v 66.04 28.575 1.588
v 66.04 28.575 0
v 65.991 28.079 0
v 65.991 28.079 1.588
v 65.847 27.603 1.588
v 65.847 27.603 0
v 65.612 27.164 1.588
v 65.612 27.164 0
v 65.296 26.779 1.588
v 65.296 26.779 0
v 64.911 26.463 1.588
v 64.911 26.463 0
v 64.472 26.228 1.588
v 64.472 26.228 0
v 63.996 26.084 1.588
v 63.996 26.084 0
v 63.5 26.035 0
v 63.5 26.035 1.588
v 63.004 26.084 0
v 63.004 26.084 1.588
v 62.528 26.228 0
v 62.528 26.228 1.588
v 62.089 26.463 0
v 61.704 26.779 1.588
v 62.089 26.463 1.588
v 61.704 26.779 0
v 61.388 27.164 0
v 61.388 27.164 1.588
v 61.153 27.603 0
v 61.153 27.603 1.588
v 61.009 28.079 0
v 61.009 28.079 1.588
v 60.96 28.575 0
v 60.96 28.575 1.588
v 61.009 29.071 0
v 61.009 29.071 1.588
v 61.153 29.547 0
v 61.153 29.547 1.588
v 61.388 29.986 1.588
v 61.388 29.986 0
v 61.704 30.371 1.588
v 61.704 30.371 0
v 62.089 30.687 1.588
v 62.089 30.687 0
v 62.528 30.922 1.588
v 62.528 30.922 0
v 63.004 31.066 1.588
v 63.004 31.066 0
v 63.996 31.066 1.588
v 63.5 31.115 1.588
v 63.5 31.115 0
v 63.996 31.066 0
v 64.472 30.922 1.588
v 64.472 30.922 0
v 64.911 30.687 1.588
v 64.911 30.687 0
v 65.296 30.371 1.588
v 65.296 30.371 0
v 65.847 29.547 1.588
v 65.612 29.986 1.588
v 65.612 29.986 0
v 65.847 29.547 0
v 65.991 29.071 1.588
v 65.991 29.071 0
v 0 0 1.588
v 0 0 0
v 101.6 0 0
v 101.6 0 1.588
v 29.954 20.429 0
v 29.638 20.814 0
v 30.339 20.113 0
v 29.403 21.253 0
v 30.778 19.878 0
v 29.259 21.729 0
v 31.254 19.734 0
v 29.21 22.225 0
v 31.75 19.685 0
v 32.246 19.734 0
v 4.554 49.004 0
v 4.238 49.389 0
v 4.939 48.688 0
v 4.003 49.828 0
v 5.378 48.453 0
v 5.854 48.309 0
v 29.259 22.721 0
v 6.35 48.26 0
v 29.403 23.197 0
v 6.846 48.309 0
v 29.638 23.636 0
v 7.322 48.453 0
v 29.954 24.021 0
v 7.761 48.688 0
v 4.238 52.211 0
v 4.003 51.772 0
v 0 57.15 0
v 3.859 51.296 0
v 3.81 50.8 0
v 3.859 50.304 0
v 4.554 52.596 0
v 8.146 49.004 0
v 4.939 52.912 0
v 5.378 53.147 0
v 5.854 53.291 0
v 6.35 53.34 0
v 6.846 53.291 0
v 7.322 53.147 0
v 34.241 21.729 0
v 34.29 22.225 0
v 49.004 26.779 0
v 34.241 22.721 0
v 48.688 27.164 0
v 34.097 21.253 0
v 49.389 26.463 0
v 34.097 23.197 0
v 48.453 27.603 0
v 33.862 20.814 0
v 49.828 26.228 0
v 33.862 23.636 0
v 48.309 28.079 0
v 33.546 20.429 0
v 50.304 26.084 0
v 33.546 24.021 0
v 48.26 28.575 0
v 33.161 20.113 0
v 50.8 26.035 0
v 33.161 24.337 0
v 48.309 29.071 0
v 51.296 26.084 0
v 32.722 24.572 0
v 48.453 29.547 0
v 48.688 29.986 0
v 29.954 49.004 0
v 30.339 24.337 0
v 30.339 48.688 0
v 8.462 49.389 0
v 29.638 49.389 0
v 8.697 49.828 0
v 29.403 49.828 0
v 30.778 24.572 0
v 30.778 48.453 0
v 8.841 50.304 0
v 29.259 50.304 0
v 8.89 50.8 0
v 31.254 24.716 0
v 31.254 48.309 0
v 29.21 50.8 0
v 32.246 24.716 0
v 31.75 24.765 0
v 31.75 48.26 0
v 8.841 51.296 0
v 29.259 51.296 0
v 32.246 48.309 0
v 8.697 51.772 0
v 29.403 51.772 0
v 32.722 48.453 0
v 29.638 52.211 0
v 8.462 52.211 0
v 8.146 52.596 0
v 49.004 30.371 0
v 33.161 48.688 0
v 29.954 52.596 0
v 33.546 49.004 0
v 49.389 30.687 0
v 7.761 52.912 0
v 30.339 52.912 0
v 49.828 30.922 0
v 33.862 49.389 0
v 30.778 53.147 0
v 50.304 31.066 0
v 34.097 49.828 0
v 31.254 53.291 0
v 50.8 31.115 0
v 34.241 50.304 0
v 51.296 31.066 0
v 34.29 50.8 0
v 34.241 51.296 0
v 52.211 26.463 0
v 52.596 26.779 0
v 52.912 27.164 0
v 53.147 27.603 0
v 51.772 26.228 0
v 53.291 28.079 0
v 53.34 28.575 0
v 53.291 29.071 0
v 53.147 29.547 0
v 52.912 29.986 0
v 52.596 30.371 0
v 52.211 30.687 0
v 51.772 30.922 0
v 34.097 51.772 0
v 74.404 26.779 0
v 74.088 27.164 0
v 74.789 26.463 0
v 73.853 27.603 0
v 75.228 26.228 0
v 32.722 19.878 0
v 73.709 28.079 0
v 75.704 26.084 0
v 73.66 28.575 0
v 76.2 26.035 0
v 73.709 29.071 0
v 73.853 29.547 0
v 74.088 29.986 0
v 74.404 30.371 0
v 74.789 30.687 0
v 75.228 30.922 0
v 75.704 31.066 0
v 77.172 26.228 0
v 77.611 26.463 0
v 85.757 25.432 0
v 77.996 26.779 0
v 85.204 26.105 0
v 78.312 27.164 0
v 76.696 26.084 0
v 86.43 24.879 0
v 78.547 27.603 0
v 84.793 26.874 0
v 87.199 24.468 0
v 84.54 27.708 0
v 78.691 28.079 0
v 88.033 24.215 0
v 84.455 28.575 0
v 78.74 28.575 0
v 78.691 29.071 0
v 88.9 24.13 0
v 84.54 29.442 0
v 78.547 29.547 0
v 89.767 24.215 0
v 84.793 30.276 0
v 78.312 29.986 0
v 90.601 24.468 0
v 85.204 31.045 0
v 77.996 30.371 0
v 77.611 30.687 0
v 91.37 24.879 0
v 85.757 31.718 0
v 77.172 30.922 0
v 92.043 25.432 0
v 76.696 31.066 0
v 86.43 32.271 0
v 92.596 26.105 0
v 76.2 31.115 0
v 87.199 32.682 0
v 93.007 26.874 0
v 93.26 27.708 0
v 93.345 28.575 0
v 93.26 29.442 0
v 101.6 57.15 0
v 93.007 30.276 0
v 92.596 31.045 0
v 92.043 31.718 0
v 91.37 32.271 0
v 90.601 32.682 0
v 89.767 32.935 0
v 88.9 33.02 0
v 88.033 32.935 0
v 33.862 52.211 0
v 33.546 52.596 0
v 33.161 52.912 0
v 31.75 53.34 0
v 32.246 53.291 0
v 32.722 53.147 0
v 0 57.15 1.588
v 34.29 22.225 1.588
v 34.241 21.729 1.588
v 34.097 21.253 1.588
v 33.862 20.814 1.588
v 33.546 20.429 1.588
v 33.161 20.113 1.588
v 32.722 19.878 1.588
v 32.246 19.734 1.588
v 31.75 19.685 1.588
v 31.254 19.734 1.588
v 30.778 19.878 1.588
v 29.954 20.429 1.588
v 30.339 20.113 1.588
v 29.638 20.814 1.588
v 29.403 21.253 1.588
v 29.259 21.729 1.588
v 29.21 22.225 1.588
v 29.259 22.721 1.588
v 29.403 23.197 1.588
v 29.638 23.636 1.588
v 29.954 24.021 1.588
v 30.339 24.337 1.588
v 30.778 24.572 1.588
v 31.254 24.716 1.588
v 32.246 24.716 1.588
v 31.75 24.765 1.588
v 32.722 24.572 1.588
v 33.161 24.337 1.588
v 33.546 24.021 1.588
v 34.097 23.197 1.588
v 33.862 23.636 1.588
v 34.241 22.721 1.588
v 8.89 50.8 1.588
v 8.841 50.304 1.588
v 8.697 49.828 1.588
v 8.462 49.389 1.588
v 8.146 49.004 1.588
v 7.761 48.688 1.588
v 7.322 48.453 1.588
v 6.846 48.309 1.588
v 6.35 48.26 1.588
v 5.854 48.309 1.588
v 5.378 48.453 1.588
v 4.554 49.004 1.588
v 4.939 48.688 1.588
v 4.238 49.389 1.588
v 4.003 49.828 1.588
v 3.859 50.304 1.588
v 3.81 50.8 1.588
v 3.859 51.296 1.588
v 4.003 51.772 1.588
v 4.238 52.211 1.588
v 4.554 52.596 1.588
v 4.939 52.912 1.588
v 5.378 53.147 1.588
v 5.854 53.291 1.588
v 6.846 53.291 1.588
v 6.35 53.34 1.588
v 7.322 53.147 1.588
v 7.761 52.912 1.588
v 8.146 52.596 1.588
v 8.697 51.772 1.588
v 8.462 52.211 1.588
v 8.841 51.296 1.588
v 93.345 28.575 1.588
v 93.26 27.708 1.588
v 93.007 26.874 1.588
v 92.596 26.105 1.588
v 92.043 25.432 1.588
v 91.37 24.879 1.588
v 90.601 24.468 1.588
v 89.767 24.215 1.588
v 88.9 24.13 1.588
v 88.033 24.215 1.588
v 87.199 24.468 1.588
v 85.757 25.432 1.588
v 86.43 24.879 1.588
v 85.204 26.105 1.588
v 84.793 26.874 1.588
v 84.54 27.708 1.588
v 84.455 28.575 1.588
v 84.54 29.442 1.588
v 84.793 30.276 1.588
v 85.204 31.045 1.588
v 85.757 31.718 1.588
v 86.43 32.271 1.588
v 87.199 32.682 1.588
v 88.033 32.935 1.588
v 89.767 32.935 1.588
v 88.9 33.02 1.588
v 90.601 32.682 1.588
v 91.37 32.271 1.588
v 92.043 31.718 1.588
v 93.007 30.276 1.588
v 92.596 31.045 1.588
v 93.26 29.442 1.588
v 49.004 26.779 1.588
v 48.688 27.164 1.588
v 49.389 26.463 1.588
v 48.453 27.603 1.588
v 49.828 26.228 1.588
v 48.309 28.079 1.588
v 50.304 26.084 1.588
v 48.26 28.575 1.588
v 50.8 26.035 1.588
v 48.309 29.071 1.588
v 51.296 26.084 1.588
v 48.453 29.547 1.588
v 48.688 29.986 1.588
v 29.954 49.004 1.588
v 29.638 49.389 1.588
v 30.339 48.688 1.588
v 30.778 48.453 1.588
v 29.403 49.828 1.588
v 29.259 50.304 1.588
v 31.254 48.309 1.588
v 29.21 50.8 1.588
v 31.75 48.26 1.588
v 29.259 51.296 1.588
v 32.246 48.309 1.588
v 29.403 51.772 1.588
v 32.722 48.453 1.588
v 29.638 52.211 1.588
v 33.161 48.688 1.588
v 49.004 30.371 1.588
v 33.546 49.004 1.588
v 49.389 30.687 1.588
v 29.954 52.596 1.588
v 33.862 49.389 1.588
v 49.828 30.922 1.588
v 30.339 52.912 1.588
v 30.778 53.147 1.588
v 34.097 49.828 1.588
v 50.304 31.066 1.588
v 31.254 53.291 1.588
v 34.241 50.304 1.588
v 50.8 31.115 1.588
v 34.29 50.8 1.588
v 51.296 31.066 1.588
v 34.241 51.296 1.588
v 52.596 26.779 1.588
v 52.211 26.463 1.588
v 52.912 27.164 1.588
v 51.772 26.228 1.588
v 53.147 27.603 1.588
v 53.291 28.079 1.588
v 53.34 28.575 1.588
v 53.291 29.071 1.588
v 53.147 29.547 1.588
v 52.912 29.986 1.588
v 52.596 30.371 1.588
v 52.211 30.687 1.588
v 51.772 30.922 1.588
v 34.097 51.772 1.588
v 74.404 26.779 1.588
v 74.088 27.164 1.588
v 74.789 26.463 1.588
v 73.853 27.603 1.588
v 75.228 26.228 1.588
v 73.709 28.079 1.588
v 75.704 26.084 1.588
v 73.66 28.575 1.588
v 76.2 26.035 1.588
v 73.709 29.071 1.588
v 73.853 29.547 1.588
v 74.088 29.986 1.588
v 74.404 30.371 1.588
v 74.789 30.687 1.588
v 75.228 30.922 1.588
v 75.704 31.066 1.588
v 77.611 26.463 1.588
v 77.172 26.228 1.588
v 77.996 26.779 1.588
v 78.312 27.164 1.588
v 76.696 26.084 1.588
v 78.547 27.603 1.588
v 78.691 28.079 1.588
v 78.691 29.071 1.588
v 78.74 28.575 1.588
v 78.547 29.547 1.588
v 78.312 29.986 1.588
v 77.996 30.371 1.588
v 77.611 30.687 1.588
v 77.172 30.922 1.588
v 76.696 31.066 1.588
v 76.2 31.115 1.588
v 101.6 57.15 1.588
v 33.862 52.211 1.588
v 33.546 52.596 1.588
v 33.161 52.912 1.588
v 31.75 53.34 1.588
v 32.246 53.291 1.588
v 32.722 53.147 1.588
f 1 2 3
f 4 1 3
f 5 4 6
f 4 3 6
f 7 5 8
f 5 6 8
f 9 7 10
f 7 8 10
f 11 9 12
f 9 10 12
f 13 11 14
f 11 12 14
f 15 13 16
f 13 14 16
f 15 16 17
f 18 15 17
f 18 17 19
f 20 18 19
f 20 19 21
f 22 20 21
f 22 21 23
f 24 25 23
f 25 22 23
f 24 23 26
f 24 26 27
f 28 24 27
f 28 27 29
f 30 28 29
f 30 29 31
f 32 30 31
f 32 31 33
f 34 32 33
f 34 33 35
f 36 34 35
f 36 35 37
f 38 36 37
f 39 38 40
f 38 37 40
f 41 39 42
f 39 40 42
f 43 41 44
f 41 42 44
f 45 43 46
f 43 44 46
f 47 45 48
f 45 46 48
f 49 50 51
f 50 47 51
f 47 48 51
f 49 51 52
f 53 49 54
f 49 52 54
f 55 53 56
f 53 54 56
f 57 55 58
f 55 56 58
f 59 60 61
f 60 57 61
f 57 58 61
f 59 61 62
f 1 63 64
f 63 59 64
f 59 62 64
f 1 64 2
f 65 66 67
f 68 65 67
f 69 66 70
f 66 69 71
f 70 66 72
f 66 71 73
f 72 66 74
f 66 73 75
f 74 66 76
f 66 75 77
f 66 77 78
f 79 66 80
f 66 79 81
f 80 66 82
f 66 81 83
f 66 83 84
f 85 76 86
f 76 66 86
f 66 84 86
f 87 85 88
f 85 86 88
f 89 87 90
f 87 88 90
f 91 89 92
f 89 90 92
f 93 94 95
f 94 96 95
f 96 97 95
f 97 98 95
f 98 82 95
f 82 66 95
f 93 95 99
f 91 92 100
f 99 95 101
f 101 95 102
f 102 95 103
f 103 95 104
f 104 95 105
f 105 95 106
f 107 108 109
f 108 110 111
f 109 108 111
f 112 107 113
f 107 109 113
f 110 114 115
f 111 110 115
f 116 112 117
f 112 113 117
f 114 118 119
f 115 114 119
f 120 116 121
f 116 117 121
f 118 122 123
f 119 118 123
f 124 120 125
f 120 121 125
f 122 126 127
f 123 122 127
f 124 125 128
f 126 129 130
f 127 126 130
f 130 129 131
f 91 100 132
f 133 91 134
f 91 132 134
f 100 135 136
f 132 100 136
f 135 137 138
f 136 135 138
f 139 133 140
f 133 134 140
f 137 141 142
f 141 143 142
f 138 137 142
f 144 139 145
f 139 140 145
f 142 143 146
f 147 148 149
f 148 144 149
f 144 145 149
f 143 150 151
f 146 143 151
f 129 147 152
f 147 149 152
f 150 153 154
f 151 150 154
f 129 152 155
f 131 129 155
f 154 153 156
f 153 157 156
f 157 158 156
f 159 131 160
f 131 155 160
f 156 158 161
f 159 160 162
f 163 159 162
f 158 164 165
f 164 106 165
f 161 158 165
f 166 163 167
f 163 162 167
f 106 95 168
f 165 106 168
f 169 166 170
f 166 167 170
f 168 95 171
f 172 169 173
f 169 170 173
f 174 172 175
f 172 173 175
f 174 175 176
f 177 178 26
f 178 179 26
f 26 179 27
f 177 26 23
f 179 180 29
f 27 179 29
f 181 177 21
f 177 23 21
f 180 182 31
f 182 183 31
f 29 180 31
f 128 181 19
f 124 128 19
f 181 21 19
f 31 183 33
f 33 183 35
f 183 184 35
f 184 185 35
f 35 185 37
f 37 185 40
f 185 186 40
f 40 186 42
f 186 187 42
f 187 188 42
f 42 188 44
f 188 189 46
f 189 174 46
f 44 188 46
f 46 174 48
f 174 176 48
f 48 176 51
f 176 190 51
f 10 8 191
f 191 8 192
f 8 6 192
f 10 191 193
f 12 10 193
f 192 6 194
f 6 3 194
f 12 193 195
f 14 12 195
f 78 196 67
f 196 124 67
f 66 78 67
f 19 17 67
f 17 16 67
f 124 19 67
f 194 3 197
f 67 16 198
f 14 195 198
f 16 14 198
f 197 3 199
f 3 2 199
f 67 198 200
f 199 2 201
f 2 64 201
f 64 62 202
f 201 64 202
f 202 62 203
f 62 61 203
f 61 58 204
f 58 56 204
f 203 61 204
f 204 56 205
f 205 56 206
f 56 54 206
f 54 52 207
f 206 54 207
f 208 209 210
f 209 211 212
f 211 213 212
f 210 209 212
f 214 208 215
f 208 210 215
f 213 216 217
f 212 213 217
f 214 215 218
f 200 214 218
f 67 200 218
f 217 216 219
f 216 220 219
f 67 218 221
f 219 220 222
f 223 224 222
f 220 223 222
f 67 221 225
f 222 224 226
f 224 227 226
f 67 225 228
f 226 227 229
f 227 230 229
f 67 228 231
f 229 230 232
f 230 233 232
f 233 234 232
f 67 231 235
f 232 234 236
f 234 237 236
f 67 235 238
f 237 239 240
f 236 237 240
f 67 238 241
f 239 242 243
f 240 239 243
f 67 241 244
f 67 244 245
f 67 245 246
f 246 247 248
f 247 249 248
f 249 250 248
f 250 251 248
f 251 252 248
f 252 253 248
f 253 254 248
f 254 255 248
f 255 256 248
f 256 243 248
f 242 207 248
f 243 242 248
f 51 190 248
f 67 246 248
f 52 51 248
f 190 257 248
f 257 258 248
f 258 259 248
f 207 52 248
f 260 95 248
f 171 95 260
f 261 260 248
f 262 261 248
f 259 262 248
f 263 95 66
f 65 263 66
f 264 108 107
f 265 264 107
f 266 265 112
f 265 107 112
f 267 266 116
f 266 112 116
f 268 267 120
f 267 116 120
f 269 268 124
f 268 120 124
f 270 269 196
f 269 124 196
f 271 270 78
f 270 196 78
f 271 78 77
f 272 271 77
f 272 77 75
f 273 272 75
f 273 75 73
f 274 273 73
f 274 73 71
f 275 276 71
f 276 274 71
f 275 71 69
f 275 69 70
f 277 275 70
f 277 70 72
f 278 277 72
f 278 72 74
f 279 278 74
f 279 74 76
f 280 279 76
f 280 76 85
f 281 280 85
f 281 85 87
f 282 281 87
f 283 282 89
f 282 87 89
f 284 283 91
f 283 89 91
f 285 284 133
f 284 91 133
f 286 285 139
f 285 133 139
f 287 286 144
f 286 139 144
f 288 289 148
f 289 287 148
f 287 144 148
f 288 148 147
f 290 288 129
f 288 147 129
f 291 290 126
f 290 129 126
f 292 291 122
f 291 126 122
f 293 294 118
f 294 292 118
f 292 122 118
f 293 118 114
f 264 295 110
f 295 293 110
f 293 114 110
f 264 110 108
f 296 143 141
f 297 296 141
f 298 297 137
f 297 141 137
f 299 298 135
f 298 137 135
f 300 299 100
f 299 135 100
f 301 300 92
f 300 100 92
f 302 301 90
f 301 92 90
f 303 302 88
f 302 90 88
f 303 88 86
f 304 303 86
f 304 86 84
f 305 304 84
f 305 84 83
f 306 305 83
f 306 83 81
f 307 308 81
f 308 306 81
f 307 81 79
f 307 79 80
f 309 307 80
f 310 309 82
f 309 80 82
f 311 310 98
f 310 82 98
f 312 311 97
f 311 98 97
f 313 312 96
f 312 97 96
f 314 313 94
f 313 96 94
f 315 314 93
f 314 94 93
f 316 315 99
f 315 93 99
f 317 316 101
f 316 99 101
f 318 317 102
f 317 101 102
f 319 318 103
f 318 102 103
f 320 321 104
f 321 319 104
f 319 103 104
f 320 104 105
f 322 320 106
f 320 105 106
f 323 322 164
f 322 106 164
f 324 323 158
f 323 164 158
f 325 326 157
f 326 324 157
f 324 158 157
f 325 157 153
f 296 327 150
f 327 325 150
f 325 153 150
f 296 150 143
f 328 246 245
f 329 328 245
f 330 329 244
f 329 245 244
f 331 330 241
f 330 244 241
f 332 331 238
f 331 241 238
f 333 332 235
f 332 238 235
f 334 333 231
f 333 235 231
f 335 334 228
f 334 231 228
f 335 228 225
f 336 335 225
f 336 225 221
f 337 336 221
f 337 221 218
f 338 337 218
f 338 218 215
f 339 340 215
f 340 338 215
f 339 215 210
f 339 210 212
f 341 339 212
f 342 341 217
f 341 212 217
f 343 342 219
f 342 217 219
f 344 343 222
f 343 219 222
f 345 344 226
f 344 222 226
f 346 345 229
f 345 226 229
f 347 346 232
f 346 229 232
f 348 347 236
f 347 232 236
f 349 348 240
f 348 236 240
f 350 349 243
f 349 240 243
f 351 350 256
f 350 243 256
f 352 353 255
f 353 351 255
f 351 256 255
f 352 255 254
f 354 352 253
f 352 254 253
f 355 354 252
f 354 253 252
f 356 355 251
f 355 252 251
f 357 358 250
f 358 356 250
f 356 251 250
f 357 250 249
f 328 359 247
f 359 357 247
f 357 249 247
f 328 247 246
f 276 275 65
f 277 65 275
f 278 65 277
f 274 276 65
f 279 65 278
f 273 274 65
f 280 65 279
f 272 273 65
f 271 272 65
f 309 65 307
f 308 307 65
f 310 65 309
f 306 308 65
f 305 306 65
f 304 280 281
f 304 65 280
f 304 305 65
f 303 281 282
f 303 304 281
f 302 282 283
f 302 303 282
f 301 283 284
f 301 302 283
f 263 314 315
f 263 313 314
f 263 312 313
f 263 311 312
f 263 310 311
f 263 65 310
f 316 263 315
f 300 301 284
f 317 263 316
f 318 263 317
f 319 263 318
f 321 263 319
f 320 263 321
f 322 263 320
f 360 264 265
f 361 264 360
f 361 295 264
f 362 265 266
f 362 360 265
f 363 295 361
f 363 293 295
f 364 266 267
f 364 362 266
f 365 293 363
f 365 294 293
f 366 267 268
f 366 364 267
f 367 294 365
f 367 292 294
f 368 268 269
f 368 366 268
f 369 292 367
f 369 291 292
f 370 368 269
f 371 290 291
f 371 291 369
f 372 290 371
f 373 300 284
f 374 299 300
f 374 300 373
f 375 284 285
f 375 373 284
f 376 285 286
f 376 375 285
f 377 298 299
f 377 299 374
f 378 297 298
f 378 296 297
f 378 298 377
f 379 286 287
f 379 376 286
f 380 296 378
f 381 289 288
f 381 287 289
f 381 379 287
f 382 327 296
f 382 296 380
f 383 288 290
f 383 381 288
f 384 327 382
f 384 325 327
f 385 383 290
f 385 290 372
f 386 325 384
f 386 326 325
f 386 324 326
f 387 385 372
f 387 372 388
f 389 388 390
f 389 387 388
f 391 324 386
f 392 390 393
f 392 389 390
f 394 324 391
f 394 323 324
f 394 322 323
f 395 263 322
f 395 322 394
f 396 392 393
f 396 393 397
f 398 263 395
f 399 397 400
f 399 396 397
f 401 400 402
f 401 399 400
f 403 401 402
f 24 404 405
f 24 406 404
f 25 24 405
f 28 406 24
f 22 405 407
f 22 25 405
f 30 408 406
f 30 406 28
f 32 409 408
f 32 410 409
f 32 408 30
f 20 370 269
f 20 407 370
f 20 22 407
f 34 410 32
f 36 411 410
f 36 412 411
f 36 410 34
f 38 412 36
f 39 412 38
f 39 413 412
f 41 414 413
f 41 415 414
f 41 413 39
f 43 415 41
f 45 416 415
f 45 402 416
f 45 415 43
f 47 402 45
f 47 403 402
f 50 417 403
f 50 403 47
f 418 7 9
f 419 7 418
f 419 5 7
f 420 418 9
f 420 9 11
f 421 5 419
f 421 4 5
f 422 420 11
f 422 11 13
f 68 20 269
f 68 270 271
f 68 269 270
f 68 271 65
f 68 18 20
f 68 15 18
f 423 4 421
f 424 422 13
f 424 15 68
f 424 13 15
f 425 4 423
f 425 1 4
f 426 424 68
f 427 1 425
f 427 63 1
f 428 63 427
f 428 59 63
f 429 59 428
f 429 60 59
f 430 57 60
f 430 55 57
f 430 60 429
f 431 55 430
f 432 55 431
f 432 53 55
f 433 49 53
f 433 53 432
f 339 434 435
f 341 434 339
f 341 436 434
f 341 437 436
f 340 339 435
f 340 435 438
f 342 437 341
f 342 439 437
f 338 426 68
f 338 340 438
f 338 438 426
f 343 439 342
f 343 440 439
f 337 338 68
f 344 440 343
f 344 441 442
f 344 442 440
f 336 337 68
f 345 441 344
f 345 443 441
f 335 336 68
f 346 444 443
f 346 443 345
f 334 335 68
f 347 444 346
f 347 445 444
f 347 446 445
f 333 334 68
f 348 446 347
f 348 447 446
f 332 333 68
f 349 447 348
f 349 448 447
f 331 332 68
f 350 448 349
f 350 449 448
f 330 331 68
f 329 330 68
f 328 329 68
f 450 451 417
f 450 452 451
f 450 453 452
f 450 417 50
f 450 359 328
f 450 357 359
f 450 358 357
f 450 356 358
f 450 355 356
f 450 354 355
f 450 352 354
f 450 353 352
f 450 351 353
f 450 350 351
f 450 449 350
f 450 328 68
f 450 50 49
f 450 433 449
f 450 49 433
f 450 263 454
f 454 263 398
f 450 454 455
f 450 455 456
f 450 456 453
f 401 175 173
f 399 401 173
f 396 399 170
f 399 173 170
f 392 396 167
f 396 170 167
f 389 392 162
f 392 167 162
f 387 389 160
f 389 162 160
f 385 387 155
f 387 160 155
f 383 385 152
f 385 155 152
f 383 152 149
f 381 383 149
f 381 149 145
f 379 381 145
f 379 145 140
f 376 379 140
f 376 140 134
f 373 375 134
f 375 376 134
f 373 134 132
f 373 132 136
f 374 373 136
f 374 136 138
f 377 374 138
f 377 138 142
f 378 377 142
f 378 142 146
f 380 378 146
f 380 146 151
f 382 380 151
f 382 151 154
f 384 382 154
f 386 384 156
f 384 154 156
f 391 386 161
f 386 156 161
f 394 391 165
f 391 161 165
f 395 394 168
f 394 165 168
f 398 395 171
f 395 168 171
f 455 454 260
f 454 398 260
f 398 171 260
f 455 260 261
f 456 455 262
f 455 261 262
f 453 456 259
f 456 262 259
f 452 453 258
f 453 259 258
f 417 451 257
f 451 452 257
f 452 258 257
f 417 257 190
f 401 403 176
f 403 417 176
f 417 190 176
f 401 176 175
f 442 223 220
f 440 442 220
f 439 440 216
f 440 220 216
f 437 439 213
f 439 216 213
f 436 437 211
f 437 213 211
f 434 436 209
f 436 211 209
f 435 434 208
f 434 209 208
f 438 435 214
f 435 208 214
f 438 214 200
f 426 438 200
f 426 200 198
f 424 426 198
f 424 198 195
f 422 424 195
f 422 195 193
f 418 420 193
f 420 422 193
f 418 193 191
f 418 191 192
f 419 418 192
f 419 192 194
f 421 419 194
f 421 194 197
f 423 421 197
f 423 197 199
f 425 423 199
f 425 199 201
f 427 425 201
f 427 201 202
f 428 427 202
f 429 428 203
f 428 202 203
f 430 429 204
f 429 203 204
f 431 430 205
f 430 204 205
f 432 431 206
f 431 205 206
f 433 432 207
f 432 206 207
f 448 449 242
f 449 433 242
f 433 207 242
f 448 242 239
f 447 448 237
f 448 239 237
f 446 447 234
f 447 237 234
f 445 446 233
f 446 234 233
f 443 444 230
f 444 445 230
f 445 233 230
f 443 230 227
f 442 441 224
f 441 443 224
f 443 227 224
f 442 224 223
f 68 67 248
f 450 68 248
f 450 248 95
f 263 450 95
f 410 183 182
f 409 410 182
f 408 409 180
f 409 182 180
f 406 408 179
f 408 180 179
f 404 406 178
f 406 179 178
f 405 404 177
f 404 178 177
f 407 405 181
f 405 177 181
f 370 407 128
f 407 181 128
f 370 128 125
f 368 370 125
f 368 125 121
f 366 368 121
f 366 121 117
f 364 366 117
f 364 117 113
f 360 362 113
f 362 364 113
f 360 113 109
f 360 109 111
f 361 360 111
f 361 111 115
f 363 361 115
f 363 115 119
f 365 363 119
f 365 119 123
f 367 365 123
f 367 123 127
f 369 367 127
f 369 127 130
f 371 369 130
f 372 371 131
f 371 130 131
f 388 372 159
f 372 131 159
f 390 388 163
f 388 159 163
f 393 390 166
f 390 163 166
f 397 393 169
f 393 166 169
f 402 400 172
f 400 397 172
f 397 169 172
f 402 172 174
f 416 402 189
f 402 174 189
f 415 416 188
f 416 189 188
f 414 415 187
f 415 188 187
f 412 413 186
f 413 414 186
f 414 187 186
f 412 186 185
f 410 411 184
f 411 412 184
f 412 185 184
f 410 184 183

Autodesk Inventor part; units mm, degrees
ref_plane "YZ Plane" through (0, 0, 0) normal (1, 0, 0) x (0, 1, 0)
ref_plane "XZ Plane" through (0, 0, 0) normal (0, 1, 0) x (-1, 0, 0)
ref_plane "XY Plane" through (0, 0, 0) normal (0, 0, 1) x (1, 0, 0)
sketch "Sketch1" plane through (0, 0, 0) normal (0, 0, 1) x (1, 0, 0)
  line L0 (0, 0) -> (101.6, 0)
  line L1 (101.6, 0) -> (101.6, 57.15)
  line L2 (101.6, 57.15) -> (0, 57.15)
  line L3 (0, 57.15) -> (0, 0)
  line L4 (2.6205, 15.875) -> (101.6, 15.875)
  line L5 (2.6205, 15.875) -> (0, 15.875)
  circle A0 centre (88.9, 28.575) radius 4.445
  circle A1 centre (76.2, 28.575) radius 2.54
  circle A2 centre (63.5, 28.575) radius 2.54
  circle A3 centre (50.8, 28.575) radius 2.54
  circle A4 centre (31.75, 22.225) radius 2.54
  circle A5 centre (6.35, 50.8) radius 2.54
  circle A6 centre (31.75, 50.8) radius 2.54
  dimension "d0" = 101.6
  dimension "d1" = 57.15
  dimension "d7" = 8.89
  dimension "d11" = 5.08
  dimension "d12" = 5.08
  dimension "d13" = 5.08
  dimension "d16" = 5.08
  dimension "d21" = 5.08
  dimension "d23" = 5.08
extrude "Extrusion2" add sketch "Sketch1" along normal blind 1.5875
properties part number "flatPoly2ForCNC"
